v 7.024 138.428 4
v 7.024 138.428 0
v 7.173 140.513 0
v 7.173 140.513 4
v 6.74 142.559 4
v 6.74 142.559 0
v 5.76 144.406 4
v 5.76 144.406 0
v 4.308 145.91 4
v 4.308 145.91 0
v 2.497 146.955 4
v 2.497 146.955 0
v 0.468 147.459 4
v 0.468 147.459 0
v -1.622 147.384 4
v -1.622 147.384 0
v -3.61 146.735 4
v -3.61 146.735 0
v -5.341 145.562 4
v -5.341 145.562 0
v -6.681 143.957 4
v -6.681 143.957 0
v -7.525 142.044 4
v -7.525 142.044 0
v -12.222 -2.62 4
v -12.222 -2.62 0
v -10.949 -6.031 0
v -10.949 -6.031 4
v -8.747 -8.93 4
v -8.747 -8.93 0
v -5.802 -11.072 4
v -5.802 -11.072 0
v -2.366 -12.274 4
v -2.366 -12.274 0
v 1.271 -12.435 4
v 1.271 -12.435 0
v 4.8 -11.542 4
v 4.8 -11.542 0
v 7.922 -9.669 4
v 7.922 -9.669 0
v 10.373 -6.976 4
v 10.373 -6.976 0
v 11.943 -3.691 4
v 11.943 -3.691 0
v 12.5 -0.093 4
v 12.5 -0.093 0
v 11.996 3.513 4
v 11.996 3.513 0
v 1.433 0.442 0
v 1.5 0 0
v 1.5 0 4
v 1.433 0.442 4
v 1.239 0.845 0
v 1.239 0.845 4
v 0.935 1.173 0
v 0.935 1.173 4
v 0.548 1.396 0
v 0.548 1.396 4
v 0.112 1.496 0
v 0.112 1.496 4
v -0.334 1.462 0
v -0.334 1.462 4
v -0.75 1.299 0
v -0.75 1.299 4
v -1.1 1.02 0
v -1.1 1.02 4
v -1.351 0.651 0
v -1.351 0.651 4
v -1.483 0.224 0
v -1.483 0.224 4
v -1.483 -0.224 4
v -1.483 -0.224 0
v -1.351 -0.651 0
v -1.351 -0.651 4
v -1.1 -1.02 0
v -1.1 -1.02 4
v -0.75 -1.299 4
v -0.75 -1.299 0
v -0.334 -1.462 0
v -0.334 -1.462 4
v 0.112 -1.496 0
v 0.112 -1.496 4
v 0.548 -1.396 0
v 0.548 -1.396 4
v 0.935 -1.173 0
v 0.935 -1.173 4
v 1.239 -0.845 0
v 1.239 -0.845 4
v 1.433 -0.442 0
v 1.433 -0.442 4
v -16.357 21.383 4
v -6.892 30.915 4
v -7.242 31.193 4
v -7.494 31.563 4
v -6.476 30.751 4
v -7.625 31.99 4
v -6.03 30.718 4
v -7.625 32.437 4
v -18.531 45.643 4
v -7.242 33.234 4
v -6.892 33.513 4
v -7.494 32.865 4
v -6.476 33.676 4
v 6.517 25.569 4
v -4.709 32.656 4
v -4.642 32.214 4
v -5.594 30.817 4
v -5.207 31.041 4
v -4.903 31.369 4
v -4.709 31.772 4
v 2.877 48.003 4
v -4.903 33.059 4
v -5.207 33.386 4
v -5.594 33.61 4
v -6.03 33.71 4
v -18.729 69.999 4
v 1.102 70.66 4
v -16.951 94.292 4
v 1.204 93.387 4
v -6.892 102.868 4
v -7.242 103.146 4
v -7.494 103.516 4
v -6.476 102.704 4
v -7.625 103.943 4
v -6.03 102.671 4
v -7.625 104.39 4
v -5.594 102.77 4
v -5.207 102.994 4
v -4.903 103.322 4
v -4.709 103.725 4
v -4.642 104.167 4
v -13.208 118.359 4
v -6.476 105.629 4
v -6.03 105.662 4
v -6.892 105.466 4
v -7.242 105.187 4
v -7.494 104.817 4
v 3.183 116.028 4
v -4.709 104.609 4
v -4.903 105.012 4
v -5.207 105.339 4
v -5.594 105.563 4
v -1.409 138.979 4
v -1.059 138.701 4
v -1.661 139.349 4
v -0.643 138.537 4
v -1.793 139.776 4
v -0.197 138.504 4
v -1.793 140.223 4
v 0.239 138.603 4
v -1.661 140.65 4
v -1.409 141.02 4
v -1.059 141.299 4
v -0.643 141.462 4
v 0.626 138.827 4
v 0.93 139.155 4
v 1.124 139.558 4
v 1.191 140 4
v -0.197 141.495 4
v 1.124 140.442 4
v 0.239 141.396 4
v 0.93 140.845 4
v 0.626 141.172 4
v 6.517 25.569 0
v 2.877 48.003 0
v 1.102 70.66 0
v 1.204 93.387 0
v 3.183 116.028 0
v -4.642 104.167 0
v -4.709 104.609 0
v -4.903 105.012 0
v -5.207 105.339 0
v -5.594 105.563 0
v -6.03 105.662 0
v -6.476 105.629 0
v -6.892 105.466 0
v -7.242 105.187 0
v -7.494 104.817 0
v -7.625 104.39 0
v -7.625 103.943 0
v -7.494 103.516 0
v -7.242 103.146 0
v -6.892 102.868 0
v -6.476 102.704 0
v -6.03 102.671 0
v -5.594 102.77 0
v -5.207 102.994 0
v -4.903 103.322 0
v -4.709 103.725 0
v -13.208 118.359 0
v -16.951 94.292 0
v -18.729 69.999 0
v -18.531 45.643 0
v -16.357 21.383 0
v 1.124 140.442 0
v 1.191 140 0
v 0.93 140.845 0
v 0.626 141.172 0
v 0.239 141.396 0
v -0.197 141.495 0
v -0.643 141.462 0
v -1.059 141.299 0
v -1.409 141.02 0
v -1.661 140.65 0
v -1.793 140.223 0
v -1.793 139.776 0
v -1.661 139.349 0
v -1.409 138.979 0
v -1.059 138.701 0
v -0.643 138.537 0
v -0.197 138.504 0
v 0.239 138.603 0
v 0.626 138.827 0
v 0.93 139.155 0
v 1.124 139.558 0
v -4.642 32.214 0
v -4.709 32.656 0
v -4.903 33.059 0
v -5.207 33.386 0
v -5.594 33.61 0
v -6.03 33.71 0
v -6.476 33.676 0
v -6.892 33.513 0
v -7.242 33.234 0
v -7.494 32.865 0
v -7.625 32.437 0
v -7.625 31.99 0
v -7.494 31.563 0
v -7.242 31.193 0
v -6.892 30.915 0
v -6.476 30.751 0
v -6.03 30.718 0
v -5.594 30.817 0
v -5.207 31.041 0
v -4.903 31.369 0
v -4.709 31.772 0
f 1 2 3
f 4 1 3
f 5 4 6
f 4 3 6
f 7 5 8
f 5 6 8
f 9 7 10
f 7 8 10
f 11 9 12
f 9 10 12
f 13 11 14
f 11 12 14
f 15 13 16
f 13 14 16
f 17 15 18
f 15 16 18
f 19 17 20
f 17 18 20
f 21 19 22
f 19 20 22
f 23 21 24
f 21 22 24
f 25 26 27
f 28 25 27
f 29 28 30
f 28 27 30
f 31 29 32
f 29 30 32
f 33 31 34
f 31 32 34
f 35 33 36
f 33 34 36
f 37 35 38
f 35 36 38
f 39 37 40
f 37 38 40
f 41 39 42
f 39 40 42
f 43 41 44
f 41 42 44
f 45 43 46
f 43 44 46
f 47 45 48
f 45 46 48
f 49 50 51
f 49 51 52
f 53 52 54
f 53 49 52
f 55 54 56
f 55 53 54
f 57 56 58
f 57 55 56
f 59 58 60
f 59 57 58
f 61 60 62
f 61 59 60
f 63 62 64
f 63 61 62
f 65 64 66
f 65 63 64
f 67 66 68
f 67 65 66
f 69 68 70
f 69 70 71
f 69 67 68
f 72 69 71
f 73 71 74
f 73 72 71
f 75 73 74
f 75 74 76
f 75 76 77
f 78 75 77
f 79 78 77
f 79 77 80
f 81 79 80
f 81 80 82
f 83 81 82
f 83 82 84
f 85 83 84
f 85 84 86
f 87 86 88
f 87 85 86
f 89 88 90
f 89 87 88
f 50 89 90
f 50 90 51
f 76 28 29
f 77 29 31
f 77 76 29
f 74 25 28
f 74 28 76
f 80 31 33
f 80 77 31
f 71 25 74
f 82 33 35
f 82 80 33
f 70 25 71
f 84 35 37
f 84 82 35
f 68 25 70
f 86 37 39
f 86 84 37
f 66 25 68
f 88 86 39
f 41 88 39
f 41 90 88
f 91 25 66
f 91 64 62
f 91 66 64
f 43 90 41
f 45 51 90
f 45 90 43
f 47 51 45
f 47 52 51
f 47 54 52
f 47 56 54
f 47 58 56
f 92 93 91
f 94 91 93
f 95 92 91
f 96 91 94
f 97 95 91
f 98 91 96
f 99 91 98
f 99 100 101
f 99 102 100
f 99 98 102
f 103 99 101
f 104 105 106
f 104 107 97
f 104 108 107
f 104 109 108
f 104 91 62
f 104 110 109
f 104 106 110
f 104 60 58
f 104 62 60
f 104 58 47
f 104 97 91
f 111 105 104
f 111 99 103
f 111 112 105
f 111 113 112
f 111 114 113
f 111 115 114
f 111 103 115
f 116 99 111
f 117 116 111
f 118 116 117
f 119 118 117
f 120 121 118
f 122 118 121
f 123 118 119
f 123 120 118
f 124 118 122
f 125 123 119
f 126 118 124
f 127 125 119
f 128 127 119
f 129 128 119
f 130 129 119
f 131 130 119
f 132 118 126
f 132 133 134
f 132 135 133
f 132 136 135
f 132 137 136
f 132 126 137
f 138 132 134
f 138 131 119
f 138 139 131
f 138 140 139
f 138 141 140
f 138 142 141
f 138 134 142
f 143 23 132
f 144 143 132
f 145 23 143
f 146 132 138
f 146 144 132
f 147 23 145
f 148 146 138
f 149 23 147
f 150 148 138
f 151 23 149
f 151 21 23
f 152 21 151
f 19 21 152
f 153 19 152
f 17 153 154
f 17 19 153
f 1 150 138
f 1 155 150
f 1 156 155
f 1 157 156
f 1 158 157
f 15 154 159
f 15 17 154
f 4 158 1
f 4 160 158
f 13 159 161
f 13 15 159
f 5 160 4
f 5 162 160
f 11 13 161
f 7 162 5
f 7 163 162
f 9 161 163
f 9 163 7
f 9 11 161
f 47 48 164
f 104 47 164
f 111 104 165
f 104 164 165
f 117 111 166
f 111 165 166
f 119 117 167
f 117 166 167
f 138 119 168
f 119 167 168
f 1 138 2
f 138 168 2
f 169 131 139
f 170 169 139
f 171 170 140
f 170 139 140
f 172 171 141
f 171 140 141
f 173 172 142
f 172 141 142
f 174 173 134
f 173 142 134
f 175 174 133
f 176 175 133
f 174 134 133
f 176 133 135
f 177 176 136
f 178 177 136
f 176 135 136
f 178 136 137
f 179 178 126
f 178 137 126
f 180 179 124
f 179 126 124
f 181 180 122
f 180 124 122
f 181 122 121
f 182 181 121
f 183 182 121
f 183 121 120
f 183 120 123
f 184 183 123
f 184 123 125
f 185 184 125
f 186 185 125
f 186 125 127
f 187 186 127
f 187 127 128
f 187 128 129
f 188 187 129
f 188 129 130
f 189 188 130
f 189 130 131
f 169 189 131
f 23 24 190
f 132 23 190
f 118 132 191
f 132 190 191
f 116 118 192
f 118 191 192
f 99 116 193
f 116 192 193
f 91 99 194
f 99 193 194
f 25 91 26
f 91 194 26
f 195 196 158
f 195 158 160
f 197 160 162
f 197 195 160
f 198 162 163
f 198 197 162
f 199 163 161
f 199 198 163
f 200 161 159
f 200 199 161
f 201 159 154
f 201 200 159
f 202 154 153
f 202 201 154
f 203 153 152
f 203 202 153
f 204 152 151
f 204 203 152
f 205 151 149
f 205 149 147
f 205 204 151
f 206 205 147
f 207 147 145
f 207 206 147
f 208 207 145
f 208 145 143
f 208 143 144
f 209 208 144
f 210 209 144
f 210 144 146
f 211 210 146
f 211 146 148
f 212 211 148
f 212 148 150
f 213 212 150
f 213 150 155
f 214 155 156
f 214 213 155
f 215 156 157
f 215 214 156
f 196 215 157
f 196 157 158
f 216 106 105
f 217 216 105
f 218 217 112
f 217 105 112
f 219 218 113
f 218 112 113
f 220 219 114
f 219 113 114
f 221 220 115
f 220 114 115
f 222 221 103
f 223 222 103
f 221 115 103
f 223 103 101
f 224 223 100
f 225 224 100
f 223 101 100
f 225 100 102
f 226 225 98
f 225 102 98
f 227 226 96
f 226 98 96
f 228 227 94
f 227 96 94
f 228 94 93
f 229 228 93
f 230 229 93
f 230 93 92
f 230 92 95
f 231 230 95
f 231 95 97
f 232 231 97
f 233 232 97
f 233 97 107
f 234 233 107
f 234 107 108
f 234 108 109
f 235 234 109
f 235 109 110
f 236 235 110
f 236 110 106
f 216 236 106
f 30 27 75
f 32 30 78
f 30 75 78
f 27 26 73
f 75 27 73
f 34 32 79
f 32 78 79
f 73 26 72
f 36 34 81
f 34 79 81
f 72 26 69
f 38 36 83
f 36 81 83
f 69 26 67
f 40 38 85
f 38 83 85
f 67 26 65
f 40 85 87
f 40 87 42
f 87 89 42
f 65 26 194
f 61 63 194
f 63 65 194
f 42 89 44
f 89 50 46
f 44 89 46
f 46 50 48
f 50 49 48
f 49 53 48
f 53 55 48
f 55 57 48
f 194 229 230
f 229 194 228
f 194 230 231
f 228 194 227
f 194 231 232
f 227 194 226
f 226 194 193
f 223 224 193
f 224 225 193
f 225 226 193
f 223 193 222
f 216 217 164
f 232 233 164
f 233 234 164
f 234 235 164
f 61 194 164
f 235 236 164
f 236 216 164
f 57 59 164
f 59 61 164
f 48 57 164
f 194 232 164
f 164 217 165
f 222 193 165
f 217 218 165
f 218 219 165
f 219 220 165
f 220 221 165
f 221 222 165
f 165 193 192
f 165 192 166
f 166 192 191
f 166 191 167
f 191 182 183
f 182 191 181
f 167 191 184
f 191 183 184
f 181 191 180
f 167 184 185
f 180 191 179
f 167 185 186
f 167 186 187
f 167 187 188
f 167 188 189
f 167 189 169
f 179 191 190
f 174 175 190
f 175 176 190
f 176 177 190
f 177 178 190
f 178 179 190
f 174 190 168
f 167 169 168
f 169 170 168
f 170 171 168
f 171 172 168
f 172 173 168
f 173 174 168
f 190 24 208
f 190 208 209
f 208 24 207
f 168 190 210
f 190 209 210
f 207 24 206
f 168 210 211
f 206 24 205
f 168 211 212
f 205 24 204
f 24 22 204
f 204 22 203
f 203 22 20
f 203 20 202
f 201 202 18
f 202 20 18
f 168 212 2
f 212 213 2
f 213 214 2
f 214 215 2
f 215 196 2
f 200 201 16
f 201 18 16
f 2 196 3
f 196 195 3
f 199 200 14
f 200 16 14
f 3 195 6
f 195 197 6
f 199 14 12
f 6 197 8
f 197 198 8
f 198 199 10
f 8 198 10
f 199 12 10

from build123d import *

# Parameters (mm, degrees)
SCHIZZO1_R                   = 1.5
ESTRUSIONE_ESTRUSIONE1_DEPTH = 4
SCHIZZO2_R                   = 1.5
TAGLIO_ESTRUSIONE1_DEPTH     = 25


with BuildPart() as part:
    # Schizzo1 → Estrusione-Estrusione1 (new body)
    with BuildSketch(Plane.XY):
        with BuildLine():
            ThreePointArc((7.023974797, 138.427683332), (1.499753731, 147.278176914), (-7.525391936, 142.044153534))
            ThreePointArc((-7.525391936, 142.044153534), (-18.729107246, 69.99949188), (-12.22229981, -2.620188418))
            ThreePointArc((-12.22229981, -2.620188418), (3.068449146, -12.117533571), (11.996332959, 3.512548298))
            ThreePointArc((11.996332959, 3.512548298), (1.102237583, 70.660238267), (7.023974797, 138.427683332))
        make_face()
        Circle(SCHIZZO1_R, mode=Mode.SUBTRACT)
        with Locations((-0.309434746, 139.999658036)):
            Circle(SCHIZZO1_R, mode=Mode.SUBTRACT)
    extrude(amount=ESTRUSIONE_ESTRUSIONE1_DEPTH)

    # Schizzo2 → Taglio-Estrusione1 (cut)
    with BuildSketch(Plane.XY.offset(4)):
        with Locations((-6.142115432, 104.166670735)):
            Circle(SCHIZZO2_R)
        with Locations((-6.142115432, 32.213749463)):
            Circle(SCHIZZO2_R)
    extrude(amount=-TAGLIO_ESTRUSIONE1_DEPTH, mode=Mode.SUBTRACT)


solid = part.part
